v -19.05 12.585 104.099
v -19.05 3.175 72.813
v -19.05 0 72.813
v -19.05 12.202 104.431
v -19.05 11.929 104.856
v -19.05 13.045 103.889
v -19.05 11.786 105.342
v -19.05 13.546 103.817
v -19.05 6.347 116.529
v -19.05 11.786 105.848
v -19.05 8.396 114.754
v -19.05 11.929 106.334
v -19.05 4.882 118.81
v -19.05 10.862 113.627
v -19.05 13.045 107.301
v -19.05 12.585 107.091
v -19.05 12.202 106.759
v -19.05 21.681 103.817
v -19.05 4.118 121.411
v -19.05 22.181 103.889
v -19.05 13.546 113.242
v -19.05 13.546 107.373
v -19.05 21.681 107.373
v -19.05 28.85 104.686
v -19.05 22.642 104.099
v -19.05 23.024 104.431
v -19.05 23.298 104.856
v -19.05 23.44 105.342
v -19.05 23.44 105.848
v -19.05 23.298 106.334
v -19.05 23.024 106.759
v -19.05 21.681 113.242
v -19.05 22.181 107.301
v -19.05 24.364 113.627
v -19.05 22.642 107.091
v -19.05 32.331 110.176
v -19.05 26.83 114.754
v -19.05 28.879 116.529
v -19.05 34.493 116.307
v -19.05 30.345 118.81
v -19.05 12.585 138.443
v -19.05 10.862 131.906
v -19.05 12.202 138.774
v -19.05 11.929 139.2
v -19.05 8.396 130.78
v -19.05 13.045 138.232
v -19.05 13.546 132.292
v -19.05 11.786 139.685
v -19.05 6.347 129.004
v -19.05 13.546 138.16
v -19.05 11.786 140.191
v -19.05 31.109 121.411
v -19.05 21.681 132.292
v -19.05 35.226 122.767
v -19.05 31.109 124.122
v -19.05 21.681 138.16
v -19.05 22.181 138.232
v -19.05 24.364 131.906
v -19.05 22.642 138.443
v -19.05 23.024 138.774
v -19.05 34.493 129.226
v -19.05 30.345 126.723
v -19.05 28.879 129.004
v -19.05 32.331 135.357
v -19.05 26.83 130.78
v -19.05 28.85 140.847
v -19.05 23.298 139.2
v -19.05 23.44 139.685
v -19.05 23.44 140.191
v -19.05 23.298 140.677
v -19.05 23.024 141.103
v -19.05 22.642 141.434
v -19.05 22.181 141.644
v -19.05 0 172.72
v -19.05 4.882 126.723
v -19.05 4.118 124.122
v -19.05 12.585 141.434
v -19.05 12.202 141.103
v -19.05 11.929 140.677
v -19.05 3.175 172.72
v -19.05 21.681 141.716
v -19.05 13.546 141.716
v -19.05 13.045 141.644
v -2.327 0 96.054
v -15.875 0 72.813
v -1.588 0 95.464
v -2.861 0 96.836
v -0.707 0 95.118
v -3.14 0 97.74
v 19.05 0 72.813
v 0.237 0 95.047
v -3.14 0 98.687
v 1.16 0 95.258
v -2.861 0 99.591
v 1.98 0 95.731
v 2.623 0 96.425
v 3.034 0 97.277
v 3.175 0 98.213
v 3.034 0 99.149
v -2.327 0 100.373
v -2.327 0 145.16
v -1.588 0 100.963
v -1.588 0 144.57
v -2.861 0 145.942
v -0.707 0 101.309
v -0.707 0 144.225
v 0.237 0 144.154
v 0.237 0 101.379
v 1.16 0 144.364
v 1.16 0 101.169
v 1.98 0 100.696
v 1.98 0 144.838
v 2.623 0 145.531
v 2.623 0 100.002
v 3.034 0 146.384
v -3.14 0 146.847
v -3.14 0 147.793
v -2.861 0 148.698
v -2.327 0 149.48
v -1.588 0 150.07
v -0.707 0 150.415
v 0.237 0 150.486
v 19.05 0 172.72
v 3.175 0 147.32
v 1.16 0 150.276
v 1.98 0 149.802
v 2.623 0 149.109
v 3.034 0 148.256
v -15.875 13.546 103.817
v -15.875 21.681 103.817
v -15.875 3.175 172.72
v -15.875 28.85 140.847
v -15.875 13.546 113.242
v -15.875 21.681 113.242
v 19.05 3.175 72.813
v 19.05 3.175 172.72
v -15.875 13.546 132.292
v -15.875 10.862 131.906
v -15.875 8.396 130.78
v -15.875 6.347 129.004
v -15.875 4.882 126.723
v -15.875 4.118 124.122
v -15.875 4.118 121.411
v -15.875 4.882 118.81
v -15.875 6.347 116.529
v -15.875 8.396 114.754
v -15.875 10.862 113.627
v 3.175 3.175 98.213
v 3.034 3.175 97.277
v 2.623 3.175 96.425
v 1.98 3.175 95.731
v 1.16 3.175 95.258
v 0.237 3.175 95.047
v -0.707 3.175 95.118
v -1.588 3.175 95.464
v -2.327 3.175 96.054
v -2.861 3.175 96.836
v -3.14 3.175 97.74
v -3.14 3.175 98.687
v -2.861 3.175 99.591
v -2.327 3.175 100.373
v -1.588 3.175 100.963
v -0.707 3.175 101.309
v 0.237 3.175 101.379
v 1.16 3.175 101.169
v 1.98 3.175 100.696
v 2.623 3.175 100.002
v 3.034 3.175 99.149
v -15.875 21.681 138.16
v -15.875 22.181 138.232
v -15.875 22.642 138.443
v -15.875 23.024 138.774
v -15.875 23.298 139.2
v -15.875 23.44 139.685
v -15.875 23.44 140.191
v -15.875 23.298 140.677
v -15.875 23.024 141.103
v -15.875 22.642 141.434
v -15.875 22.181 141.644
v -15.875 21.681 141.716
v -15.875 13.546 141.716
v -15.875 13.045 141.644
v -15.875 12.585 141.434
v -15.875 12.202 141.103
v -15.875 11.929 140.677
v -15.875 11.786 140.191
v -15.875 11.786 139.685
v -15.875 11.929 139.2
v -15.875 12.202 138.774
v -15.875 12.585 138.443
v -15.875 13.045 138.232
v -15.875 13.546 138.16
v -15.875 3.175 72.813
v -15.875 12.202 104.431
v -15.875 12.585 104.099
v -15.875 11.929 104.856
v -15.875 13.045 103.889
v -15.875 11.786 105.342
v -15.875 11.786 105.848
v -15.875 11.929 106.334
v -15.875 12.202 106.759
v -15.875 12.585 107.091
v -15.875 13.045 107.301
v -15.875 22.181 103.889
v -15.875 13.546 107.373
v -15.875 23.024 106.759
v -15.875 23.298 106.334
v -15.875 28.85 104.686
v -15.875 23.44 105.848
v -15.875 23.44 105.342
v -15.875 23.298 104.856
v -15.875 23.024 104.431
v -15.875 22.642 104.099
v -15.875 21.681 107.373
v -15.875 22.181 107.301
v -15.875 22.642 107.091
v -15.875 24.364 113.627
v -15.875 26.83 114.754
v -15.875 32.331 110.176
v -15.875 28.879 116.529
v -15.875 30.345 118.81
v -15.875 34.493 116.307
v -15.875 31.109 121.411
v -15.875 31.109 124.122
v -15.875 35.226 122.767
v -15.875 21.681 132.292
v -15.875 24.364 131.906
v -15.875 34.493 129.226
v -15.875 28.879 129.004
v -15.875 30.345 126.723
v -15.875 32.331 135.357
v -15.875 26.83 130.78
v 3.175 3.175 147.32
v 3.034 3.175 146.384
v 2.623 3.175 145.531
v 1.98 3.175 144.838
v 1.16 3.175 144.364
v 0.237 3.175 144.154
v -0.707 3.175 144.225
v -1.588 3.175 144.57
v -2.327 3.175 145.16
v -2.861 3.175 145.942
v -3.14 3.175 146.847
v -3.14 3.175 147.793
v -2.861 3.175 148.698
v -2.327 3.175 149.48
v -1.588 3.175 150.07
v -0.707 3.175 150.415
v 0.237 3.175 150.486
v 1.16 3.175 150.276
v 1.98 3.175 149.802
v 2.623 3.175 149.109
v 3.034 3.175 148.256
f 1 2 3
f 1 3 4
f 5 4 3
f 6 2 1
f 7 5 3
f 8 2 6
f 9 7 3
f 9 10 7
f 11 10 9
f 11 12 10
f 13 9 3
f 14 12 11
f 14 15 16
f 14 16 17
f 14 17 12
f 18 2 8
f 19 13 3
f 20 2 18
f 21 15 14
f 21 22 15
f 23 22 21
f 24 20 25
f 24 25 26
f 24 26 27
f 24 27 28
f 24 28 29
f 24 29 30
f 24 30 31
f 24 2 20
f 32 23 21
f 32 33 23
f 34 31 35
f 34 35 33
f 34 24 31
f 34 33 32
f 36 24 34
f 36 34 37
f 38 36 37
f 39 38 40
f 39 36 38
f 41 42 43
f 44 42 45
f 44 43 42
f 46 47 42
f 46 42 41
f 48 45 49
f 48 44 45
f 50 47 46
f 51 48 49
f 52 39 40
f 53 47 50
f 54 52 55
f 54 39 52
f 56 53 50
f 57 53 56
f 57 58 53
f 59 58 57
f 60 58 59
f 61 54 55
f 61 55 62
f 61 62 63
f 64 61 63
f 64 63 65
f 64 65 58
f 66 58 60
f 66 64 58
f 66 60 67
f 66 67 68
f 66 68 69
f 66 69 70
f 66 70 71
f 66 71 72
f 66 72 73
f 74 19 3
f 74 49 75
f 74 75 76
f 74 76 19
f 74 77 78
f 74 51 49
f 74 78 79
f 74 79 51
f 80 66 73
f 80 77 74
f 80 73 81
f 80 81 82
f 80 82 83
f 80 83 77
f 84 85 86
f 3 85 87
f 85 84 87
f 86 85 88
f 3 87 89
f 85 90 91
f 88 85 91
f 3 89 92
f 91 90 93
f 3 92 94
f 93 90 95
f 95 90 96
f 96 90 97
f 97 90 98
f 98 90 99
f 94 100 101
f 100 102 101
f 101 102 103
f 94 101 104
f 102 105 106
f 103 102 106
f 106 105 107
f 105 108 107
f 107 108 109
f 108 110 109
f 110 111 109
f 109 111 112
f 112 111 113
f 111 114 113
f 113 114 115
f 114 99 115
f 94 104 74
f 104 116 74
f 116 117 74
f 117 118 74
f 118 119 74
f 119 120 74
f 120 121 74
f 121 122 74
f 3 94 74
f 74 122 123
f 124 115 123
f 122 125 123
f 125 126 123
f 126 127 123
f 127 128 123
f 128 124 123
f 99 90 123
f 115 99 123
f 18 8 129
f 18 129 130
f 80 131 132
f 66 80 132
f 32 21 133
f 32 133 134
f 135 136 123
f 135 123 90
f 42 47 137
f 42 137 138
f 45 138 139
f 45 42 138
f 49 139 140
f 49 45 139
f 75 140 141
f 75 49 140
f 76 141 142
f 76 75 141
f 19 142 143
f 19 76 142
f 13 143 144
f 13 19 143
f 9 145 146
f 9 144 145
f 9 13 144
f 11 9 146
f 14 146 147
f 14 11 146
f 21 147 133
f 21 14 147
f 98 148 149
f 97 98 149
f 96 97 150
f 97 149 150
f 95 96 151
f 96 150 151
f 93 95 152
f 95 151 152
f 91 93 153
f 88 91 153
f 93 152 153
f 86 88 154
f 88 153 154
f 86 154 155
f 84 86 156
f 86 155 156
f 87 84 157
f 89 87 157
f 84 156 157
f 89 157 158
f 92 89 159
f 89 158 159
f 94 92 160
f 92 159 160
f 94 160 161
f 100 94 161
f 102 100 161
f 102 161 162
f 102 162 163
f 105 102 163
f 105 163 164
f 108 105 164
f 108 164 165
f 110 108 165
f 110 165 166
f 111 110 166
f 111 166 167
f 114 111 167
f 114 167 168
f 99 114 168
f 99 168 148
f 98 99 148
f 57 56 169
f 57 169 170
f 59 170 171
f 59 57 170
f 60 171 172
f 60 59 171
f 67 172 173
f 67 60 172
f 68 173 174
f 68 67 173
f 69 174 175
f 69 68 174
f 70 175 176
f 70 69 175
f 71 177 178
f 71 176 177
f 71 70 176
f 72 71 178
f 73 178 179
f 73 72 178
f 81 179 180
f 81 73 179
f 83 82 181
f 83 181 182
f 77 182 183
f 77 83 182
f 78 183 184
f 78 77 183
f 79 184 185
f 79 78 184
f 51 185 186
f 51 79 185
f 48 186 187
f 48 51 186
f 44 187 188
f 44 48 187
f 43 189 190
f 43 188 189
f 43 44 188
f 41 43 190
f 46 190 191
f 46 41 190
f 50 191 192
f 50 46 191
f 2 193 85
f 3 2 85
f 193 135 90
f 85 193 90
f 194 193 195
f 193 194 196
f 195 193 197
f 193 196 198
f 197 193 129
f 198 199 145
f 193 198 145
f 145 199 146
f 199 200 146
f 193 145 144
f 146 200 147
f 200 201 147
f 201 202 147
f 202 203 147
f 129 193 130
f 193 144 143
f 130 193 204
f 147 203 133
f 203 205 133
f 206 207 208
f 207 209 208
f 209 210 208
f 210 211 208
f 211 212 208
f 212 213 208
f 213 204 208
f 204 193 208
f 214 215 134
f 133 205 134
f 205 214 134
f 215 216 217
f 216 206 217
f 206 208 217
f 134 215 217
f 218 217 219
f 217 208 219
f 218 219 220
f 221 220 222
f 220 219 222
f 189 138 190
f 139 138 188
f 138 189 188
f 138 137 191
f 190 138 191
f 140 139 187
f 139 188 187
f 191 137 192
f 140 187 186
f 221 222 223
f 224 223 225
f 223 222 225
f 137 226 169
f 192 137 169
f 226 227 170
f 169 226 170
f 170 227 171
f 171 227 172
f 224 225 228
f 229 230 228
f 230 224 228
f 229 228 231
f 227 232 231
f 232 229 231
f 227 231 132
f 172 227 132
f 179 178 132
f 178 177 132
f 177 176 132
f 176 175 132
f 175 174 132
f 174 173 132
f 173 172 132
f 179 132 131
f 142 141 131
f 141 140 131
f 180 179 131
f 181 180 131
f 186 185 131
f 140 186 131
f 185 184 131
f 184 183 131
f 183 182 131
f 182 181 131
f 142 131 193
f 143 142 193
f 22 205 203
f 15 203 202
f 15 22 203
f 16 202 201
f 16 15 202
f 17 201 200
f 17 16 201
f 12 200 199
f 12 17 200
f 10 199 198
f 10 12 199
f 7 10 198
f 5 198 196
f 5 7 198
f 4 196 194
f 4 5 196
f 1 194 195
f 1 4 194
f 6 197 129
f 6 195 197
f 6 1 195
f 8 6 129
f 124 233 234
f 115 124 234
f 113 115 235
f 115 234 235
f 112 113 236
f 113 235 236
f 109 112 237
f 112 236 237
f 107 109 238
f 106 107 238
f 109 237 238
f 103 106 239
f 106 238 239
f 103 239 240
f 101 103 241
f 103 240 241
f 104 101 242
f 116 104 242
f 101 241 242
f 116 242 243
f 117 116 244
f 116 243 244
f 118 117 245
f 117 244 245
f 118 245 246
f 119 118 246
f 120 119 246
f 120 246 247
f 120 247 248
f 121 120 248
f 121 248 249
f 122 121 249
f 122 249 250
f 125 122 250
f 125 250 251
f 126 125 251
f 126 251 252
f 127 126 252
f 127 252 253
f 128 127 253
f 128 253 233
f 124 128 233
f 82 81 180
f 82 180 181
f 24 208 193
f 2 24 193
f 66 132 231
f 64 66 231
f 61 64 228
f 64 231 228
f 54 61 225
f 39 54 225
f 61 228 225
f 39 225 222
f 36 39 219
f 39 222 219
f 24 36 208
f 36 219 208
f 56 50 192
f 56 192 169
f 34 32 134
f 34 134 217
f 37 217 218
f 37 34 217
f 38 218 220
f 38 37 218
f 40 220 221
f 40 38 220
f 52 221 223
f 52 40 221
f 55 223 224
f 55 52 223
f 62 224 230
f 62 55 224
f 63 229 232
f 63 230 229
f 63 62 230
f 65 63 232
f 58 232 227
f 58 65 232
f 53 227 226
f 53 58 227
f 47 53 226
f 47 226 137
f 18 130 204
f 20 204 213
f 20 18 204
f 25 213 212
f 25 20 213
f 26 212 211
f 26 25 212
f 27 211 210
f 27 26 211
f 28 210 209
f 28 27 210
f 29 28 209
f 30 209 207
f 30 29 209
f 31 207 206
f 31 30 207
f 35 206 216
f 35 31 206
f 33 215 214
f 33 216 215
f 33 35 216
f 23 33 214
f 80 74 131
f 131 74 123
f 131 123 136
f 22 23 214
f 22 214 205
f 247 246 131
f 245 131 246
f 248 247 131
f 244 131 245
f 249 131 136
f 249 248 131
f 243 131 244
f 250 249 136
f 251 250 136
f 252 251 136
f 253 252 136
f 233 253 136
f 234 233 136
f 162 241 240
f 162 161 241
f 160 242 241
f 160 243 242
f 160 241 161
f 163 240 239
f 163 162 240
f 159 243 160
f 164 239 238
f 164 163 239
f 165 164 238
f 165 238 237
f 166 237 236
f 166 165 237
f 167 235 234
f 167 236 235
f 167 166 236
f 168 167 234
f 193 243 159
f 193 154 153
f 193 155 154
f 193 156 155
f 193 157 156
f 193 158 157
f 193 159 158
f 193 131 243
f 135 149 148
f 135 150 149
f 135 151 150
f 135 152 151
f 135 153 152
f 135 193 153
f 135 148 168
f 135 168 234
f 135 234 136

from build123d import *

# Parameters (mm, degrees)
SKETCH1_W           = 133.35
SKETCH1_H           = 50.8
BOSS_EXTRUDE1_DEPTH = 3.175
SKETCH4_W           = 76.2
SKETCH4_H           = 3.175
BOSS_EXTRUDE2_DEPTH = 147.32
SKETCH3_R           = 3.175
CUT_EXTRUDE2_DEPTH  = 4.175
SKETCH5_W           = 133.35
SKETCH5_H           = 88.9
CUT_EXTRUDE3_DEPTH  = 4.175
SKETCH7_W           = 22.225
SKETCH7_H           = 109.22
CUT_EXTRUDE4_DEPTH  = 4.175
SKETCH8_OUTSIDE_W   = 80.349
SKETCH8_OUTSIDE_H   = 135.594
SKETCH8_OUTSIDE_W_2 = 47.625
SKETCH8_OUTSIDE_H_2 = 99.906666667
CUT_EXTRUDE5_DEPTH  = 4.175
BOSS_EXTRUDE4_DEPTH = 3.175
SKETCH10_W          = 12.7
SKETCH10_H          = 99.906666667
CUT_EXTRUDE6_DEPTH  = 4.175
CUT_EXTRUDE7_DEPTH  = 39.1


with BuildPart() as part:
    # Sketch1 → Boss-Extrude1 (new body)
    with BuildSketch(Plane(origin=(0, 0, 0), x_dir=(1, 0, 0), z_dir=(0, 1, 0))):
        Rectangle(SKETCH1_W, SKETCH1_H)
    extrude(amount=BOSS_EXTRUDE1_DEPTH)

    # Sketch4 → Boss-Extrude2 (add)
    with BuildSketch(Plane.XY.offset(25.4)):
        with Locations((0, 1.5875)):
            Rectangle(SKETCH4_W, SKETCH4_H)
    extrude(amount=BOSS_EXTRUDE2_DEPTH)

    # Sketch3 → Cut-Extrude2 (cut, through all)
    with BuildSketch(Plane(origin=(0, 3.175, 0), x_dir=(1, 0, 0), z_dir=(0, 1, 0))):
        Circle(SKETCH3_R)
        with Locations((0, -49.106666667)):
            Circle(SKETCH3_R)
        with Locations((0, -98.213333333)):
            Circle(SKETCH3_R)
        with Locations((0, -147.32)):
            Circle(SKETCH3_R)
    extrude(amount=-CUT_EXTRUDE2_DEPTH, mode=Mode.SUBTRACT)

    # Sketch5 → Cut-Extrude3 (cut, through all)
    with BuildSketch(Plane(origin=(0, 3.175, 0), x_dir=(1, 0, 0), z_dir=(0, 1, 0))):
        with Locations((0, -19.05)):
            Rectangle(SKETCH5_W, SKETCH5_H)
    extrude(amount=-CUT_EXTRUDE3_DEPTH, mode=Mode.SUBTRACT)

    # Sketch7 → Cut-Extrude4 (cut, through all)
    with BuildSketch(Plane(origin=(0, 3.175, 0), x_dir=(1, 0, 0), z_dir=(0, 1, 0))):
        with Locations((-26.9875, -118.11)):
            Rectangle(SKETCH7_W, SKETCH7_H)
    extrude(amount=-CUT_EXTRUDE4_DEPTH, mode=Mode.SUBTRACT)

    # Sketch8 outside → Cut-Extrude5 (cut, through all)
    with BuildSketch(Plane(origin=(0, 3.175, 0), x_dir=(1, 0, 0), z_dir=(0, 1, 0))):
        with Locations((11.1125, -118.11)):
            Rectangle(SKETCH8_OUTSIDE_W, SKETCH8_OUTSIDE_H)
        with Locations((7.9375, -122.766666667)):
            Rectangle(SKETCH8_OUTSIDE_W_2, SKETCH8_OUTSIDE_H_2, mode=Mode.SUBTRACT)
    extrude(amount=-CUT_EXTRUDE5_DEPTH, mode=Mode.SUBTRACT)

    # Sketch9 → Boss-Extrude4 (add)
    with BuildSketch(Plane.ZY.offset(15.875)):
        with BuildLine():
            Line((172.72, 3.175), (140.847432308, 28.849821314))
            ThreePointArc((140.847432308, 28.849821314), (122.766666667, 35.226473065), (104.685901025, 28.849821314))
            Line((104.685901025, 28.849821314), (72.813333333, 3.175))
            Line((72.813333333, 3.175), (72.813333333, 0))
            Line((72.813333333, 0), (172.72, 0))
            Line((172.72, 0), (172.72, 3.175))
        make_face()
    extrude(amount=BOSS_EXTRUDE4_DEPTH)

    # Sketch10 → Cut-Extrude6 (cut, through all)
    with BuildSketch(Plane(origin=(0, 3.175, 0), x_dir=(1, 0, 0), z_dir=(0, 1, 0))):
        with Locations((25.4, -122.766666667)):
            Rectangle(SKETCH10_W, SKETCH10_H)
    extrude(amount=-CUT_EXTRUDE6_DEPTH, mode=Mode.SUBTRACT)

    # Sketch11 → Cut-Extrude7 (cut, through all)
    with BuildSketch(Plane.ZY.offset(19.05)):
        with BuildLine():
            Line((132.291666667, 21.680516849), (132.291666667, 13.545956216))
            ThreePointArc((132.291666667, 13.545956216), (122.766666667, 4.020956216), (113.241666667, 13.545956216))
            Line((113.241666667, 13.545956216), (113.241666667, 21.680516849))
            ThreePointArc((113.241666667, 21.680516849), (122.766666667, 31.205516849), (132.291666667, 21.680516849))
        make_face()
        with BuildLine():
            Line((141.71638956, 21.680516849), (141.71638956, 13.545956216))
            ThreePointArc((141.71638956, 13.545956216), (139.93838956, 11.767956216), (138.16038956, 13.545956216))
            Line((138.16038956, 13.545956216), (138.16038956, 21.680516849))
            ThreePointArc((138.16038956, 21.680516849), (139.93838956, 23.458516849), (141.71638956, 21.680516849))
        make_face()
        with BuildLine():
            Line((107.372943773, 21.680516849), (107.372943773, 13.545956216))
            ThreePointArc((107.372943773, 13.545956216), (105.594943773, 11.767956216), (103.816943773, 13.545956216))
            Line((103.816943773, 13.545956216), (103.816943773, 21.680516849))
            ThreePointArc((103.816943773, 21.680516849), (105.594943773, 23.458516849), (107.372943773, 21.680516849))
        make_face()
    extrude(amount=-CUT_EXTRUDE7_DEPTH, mode=Mode.SUBTRACT)


solid = part.part
